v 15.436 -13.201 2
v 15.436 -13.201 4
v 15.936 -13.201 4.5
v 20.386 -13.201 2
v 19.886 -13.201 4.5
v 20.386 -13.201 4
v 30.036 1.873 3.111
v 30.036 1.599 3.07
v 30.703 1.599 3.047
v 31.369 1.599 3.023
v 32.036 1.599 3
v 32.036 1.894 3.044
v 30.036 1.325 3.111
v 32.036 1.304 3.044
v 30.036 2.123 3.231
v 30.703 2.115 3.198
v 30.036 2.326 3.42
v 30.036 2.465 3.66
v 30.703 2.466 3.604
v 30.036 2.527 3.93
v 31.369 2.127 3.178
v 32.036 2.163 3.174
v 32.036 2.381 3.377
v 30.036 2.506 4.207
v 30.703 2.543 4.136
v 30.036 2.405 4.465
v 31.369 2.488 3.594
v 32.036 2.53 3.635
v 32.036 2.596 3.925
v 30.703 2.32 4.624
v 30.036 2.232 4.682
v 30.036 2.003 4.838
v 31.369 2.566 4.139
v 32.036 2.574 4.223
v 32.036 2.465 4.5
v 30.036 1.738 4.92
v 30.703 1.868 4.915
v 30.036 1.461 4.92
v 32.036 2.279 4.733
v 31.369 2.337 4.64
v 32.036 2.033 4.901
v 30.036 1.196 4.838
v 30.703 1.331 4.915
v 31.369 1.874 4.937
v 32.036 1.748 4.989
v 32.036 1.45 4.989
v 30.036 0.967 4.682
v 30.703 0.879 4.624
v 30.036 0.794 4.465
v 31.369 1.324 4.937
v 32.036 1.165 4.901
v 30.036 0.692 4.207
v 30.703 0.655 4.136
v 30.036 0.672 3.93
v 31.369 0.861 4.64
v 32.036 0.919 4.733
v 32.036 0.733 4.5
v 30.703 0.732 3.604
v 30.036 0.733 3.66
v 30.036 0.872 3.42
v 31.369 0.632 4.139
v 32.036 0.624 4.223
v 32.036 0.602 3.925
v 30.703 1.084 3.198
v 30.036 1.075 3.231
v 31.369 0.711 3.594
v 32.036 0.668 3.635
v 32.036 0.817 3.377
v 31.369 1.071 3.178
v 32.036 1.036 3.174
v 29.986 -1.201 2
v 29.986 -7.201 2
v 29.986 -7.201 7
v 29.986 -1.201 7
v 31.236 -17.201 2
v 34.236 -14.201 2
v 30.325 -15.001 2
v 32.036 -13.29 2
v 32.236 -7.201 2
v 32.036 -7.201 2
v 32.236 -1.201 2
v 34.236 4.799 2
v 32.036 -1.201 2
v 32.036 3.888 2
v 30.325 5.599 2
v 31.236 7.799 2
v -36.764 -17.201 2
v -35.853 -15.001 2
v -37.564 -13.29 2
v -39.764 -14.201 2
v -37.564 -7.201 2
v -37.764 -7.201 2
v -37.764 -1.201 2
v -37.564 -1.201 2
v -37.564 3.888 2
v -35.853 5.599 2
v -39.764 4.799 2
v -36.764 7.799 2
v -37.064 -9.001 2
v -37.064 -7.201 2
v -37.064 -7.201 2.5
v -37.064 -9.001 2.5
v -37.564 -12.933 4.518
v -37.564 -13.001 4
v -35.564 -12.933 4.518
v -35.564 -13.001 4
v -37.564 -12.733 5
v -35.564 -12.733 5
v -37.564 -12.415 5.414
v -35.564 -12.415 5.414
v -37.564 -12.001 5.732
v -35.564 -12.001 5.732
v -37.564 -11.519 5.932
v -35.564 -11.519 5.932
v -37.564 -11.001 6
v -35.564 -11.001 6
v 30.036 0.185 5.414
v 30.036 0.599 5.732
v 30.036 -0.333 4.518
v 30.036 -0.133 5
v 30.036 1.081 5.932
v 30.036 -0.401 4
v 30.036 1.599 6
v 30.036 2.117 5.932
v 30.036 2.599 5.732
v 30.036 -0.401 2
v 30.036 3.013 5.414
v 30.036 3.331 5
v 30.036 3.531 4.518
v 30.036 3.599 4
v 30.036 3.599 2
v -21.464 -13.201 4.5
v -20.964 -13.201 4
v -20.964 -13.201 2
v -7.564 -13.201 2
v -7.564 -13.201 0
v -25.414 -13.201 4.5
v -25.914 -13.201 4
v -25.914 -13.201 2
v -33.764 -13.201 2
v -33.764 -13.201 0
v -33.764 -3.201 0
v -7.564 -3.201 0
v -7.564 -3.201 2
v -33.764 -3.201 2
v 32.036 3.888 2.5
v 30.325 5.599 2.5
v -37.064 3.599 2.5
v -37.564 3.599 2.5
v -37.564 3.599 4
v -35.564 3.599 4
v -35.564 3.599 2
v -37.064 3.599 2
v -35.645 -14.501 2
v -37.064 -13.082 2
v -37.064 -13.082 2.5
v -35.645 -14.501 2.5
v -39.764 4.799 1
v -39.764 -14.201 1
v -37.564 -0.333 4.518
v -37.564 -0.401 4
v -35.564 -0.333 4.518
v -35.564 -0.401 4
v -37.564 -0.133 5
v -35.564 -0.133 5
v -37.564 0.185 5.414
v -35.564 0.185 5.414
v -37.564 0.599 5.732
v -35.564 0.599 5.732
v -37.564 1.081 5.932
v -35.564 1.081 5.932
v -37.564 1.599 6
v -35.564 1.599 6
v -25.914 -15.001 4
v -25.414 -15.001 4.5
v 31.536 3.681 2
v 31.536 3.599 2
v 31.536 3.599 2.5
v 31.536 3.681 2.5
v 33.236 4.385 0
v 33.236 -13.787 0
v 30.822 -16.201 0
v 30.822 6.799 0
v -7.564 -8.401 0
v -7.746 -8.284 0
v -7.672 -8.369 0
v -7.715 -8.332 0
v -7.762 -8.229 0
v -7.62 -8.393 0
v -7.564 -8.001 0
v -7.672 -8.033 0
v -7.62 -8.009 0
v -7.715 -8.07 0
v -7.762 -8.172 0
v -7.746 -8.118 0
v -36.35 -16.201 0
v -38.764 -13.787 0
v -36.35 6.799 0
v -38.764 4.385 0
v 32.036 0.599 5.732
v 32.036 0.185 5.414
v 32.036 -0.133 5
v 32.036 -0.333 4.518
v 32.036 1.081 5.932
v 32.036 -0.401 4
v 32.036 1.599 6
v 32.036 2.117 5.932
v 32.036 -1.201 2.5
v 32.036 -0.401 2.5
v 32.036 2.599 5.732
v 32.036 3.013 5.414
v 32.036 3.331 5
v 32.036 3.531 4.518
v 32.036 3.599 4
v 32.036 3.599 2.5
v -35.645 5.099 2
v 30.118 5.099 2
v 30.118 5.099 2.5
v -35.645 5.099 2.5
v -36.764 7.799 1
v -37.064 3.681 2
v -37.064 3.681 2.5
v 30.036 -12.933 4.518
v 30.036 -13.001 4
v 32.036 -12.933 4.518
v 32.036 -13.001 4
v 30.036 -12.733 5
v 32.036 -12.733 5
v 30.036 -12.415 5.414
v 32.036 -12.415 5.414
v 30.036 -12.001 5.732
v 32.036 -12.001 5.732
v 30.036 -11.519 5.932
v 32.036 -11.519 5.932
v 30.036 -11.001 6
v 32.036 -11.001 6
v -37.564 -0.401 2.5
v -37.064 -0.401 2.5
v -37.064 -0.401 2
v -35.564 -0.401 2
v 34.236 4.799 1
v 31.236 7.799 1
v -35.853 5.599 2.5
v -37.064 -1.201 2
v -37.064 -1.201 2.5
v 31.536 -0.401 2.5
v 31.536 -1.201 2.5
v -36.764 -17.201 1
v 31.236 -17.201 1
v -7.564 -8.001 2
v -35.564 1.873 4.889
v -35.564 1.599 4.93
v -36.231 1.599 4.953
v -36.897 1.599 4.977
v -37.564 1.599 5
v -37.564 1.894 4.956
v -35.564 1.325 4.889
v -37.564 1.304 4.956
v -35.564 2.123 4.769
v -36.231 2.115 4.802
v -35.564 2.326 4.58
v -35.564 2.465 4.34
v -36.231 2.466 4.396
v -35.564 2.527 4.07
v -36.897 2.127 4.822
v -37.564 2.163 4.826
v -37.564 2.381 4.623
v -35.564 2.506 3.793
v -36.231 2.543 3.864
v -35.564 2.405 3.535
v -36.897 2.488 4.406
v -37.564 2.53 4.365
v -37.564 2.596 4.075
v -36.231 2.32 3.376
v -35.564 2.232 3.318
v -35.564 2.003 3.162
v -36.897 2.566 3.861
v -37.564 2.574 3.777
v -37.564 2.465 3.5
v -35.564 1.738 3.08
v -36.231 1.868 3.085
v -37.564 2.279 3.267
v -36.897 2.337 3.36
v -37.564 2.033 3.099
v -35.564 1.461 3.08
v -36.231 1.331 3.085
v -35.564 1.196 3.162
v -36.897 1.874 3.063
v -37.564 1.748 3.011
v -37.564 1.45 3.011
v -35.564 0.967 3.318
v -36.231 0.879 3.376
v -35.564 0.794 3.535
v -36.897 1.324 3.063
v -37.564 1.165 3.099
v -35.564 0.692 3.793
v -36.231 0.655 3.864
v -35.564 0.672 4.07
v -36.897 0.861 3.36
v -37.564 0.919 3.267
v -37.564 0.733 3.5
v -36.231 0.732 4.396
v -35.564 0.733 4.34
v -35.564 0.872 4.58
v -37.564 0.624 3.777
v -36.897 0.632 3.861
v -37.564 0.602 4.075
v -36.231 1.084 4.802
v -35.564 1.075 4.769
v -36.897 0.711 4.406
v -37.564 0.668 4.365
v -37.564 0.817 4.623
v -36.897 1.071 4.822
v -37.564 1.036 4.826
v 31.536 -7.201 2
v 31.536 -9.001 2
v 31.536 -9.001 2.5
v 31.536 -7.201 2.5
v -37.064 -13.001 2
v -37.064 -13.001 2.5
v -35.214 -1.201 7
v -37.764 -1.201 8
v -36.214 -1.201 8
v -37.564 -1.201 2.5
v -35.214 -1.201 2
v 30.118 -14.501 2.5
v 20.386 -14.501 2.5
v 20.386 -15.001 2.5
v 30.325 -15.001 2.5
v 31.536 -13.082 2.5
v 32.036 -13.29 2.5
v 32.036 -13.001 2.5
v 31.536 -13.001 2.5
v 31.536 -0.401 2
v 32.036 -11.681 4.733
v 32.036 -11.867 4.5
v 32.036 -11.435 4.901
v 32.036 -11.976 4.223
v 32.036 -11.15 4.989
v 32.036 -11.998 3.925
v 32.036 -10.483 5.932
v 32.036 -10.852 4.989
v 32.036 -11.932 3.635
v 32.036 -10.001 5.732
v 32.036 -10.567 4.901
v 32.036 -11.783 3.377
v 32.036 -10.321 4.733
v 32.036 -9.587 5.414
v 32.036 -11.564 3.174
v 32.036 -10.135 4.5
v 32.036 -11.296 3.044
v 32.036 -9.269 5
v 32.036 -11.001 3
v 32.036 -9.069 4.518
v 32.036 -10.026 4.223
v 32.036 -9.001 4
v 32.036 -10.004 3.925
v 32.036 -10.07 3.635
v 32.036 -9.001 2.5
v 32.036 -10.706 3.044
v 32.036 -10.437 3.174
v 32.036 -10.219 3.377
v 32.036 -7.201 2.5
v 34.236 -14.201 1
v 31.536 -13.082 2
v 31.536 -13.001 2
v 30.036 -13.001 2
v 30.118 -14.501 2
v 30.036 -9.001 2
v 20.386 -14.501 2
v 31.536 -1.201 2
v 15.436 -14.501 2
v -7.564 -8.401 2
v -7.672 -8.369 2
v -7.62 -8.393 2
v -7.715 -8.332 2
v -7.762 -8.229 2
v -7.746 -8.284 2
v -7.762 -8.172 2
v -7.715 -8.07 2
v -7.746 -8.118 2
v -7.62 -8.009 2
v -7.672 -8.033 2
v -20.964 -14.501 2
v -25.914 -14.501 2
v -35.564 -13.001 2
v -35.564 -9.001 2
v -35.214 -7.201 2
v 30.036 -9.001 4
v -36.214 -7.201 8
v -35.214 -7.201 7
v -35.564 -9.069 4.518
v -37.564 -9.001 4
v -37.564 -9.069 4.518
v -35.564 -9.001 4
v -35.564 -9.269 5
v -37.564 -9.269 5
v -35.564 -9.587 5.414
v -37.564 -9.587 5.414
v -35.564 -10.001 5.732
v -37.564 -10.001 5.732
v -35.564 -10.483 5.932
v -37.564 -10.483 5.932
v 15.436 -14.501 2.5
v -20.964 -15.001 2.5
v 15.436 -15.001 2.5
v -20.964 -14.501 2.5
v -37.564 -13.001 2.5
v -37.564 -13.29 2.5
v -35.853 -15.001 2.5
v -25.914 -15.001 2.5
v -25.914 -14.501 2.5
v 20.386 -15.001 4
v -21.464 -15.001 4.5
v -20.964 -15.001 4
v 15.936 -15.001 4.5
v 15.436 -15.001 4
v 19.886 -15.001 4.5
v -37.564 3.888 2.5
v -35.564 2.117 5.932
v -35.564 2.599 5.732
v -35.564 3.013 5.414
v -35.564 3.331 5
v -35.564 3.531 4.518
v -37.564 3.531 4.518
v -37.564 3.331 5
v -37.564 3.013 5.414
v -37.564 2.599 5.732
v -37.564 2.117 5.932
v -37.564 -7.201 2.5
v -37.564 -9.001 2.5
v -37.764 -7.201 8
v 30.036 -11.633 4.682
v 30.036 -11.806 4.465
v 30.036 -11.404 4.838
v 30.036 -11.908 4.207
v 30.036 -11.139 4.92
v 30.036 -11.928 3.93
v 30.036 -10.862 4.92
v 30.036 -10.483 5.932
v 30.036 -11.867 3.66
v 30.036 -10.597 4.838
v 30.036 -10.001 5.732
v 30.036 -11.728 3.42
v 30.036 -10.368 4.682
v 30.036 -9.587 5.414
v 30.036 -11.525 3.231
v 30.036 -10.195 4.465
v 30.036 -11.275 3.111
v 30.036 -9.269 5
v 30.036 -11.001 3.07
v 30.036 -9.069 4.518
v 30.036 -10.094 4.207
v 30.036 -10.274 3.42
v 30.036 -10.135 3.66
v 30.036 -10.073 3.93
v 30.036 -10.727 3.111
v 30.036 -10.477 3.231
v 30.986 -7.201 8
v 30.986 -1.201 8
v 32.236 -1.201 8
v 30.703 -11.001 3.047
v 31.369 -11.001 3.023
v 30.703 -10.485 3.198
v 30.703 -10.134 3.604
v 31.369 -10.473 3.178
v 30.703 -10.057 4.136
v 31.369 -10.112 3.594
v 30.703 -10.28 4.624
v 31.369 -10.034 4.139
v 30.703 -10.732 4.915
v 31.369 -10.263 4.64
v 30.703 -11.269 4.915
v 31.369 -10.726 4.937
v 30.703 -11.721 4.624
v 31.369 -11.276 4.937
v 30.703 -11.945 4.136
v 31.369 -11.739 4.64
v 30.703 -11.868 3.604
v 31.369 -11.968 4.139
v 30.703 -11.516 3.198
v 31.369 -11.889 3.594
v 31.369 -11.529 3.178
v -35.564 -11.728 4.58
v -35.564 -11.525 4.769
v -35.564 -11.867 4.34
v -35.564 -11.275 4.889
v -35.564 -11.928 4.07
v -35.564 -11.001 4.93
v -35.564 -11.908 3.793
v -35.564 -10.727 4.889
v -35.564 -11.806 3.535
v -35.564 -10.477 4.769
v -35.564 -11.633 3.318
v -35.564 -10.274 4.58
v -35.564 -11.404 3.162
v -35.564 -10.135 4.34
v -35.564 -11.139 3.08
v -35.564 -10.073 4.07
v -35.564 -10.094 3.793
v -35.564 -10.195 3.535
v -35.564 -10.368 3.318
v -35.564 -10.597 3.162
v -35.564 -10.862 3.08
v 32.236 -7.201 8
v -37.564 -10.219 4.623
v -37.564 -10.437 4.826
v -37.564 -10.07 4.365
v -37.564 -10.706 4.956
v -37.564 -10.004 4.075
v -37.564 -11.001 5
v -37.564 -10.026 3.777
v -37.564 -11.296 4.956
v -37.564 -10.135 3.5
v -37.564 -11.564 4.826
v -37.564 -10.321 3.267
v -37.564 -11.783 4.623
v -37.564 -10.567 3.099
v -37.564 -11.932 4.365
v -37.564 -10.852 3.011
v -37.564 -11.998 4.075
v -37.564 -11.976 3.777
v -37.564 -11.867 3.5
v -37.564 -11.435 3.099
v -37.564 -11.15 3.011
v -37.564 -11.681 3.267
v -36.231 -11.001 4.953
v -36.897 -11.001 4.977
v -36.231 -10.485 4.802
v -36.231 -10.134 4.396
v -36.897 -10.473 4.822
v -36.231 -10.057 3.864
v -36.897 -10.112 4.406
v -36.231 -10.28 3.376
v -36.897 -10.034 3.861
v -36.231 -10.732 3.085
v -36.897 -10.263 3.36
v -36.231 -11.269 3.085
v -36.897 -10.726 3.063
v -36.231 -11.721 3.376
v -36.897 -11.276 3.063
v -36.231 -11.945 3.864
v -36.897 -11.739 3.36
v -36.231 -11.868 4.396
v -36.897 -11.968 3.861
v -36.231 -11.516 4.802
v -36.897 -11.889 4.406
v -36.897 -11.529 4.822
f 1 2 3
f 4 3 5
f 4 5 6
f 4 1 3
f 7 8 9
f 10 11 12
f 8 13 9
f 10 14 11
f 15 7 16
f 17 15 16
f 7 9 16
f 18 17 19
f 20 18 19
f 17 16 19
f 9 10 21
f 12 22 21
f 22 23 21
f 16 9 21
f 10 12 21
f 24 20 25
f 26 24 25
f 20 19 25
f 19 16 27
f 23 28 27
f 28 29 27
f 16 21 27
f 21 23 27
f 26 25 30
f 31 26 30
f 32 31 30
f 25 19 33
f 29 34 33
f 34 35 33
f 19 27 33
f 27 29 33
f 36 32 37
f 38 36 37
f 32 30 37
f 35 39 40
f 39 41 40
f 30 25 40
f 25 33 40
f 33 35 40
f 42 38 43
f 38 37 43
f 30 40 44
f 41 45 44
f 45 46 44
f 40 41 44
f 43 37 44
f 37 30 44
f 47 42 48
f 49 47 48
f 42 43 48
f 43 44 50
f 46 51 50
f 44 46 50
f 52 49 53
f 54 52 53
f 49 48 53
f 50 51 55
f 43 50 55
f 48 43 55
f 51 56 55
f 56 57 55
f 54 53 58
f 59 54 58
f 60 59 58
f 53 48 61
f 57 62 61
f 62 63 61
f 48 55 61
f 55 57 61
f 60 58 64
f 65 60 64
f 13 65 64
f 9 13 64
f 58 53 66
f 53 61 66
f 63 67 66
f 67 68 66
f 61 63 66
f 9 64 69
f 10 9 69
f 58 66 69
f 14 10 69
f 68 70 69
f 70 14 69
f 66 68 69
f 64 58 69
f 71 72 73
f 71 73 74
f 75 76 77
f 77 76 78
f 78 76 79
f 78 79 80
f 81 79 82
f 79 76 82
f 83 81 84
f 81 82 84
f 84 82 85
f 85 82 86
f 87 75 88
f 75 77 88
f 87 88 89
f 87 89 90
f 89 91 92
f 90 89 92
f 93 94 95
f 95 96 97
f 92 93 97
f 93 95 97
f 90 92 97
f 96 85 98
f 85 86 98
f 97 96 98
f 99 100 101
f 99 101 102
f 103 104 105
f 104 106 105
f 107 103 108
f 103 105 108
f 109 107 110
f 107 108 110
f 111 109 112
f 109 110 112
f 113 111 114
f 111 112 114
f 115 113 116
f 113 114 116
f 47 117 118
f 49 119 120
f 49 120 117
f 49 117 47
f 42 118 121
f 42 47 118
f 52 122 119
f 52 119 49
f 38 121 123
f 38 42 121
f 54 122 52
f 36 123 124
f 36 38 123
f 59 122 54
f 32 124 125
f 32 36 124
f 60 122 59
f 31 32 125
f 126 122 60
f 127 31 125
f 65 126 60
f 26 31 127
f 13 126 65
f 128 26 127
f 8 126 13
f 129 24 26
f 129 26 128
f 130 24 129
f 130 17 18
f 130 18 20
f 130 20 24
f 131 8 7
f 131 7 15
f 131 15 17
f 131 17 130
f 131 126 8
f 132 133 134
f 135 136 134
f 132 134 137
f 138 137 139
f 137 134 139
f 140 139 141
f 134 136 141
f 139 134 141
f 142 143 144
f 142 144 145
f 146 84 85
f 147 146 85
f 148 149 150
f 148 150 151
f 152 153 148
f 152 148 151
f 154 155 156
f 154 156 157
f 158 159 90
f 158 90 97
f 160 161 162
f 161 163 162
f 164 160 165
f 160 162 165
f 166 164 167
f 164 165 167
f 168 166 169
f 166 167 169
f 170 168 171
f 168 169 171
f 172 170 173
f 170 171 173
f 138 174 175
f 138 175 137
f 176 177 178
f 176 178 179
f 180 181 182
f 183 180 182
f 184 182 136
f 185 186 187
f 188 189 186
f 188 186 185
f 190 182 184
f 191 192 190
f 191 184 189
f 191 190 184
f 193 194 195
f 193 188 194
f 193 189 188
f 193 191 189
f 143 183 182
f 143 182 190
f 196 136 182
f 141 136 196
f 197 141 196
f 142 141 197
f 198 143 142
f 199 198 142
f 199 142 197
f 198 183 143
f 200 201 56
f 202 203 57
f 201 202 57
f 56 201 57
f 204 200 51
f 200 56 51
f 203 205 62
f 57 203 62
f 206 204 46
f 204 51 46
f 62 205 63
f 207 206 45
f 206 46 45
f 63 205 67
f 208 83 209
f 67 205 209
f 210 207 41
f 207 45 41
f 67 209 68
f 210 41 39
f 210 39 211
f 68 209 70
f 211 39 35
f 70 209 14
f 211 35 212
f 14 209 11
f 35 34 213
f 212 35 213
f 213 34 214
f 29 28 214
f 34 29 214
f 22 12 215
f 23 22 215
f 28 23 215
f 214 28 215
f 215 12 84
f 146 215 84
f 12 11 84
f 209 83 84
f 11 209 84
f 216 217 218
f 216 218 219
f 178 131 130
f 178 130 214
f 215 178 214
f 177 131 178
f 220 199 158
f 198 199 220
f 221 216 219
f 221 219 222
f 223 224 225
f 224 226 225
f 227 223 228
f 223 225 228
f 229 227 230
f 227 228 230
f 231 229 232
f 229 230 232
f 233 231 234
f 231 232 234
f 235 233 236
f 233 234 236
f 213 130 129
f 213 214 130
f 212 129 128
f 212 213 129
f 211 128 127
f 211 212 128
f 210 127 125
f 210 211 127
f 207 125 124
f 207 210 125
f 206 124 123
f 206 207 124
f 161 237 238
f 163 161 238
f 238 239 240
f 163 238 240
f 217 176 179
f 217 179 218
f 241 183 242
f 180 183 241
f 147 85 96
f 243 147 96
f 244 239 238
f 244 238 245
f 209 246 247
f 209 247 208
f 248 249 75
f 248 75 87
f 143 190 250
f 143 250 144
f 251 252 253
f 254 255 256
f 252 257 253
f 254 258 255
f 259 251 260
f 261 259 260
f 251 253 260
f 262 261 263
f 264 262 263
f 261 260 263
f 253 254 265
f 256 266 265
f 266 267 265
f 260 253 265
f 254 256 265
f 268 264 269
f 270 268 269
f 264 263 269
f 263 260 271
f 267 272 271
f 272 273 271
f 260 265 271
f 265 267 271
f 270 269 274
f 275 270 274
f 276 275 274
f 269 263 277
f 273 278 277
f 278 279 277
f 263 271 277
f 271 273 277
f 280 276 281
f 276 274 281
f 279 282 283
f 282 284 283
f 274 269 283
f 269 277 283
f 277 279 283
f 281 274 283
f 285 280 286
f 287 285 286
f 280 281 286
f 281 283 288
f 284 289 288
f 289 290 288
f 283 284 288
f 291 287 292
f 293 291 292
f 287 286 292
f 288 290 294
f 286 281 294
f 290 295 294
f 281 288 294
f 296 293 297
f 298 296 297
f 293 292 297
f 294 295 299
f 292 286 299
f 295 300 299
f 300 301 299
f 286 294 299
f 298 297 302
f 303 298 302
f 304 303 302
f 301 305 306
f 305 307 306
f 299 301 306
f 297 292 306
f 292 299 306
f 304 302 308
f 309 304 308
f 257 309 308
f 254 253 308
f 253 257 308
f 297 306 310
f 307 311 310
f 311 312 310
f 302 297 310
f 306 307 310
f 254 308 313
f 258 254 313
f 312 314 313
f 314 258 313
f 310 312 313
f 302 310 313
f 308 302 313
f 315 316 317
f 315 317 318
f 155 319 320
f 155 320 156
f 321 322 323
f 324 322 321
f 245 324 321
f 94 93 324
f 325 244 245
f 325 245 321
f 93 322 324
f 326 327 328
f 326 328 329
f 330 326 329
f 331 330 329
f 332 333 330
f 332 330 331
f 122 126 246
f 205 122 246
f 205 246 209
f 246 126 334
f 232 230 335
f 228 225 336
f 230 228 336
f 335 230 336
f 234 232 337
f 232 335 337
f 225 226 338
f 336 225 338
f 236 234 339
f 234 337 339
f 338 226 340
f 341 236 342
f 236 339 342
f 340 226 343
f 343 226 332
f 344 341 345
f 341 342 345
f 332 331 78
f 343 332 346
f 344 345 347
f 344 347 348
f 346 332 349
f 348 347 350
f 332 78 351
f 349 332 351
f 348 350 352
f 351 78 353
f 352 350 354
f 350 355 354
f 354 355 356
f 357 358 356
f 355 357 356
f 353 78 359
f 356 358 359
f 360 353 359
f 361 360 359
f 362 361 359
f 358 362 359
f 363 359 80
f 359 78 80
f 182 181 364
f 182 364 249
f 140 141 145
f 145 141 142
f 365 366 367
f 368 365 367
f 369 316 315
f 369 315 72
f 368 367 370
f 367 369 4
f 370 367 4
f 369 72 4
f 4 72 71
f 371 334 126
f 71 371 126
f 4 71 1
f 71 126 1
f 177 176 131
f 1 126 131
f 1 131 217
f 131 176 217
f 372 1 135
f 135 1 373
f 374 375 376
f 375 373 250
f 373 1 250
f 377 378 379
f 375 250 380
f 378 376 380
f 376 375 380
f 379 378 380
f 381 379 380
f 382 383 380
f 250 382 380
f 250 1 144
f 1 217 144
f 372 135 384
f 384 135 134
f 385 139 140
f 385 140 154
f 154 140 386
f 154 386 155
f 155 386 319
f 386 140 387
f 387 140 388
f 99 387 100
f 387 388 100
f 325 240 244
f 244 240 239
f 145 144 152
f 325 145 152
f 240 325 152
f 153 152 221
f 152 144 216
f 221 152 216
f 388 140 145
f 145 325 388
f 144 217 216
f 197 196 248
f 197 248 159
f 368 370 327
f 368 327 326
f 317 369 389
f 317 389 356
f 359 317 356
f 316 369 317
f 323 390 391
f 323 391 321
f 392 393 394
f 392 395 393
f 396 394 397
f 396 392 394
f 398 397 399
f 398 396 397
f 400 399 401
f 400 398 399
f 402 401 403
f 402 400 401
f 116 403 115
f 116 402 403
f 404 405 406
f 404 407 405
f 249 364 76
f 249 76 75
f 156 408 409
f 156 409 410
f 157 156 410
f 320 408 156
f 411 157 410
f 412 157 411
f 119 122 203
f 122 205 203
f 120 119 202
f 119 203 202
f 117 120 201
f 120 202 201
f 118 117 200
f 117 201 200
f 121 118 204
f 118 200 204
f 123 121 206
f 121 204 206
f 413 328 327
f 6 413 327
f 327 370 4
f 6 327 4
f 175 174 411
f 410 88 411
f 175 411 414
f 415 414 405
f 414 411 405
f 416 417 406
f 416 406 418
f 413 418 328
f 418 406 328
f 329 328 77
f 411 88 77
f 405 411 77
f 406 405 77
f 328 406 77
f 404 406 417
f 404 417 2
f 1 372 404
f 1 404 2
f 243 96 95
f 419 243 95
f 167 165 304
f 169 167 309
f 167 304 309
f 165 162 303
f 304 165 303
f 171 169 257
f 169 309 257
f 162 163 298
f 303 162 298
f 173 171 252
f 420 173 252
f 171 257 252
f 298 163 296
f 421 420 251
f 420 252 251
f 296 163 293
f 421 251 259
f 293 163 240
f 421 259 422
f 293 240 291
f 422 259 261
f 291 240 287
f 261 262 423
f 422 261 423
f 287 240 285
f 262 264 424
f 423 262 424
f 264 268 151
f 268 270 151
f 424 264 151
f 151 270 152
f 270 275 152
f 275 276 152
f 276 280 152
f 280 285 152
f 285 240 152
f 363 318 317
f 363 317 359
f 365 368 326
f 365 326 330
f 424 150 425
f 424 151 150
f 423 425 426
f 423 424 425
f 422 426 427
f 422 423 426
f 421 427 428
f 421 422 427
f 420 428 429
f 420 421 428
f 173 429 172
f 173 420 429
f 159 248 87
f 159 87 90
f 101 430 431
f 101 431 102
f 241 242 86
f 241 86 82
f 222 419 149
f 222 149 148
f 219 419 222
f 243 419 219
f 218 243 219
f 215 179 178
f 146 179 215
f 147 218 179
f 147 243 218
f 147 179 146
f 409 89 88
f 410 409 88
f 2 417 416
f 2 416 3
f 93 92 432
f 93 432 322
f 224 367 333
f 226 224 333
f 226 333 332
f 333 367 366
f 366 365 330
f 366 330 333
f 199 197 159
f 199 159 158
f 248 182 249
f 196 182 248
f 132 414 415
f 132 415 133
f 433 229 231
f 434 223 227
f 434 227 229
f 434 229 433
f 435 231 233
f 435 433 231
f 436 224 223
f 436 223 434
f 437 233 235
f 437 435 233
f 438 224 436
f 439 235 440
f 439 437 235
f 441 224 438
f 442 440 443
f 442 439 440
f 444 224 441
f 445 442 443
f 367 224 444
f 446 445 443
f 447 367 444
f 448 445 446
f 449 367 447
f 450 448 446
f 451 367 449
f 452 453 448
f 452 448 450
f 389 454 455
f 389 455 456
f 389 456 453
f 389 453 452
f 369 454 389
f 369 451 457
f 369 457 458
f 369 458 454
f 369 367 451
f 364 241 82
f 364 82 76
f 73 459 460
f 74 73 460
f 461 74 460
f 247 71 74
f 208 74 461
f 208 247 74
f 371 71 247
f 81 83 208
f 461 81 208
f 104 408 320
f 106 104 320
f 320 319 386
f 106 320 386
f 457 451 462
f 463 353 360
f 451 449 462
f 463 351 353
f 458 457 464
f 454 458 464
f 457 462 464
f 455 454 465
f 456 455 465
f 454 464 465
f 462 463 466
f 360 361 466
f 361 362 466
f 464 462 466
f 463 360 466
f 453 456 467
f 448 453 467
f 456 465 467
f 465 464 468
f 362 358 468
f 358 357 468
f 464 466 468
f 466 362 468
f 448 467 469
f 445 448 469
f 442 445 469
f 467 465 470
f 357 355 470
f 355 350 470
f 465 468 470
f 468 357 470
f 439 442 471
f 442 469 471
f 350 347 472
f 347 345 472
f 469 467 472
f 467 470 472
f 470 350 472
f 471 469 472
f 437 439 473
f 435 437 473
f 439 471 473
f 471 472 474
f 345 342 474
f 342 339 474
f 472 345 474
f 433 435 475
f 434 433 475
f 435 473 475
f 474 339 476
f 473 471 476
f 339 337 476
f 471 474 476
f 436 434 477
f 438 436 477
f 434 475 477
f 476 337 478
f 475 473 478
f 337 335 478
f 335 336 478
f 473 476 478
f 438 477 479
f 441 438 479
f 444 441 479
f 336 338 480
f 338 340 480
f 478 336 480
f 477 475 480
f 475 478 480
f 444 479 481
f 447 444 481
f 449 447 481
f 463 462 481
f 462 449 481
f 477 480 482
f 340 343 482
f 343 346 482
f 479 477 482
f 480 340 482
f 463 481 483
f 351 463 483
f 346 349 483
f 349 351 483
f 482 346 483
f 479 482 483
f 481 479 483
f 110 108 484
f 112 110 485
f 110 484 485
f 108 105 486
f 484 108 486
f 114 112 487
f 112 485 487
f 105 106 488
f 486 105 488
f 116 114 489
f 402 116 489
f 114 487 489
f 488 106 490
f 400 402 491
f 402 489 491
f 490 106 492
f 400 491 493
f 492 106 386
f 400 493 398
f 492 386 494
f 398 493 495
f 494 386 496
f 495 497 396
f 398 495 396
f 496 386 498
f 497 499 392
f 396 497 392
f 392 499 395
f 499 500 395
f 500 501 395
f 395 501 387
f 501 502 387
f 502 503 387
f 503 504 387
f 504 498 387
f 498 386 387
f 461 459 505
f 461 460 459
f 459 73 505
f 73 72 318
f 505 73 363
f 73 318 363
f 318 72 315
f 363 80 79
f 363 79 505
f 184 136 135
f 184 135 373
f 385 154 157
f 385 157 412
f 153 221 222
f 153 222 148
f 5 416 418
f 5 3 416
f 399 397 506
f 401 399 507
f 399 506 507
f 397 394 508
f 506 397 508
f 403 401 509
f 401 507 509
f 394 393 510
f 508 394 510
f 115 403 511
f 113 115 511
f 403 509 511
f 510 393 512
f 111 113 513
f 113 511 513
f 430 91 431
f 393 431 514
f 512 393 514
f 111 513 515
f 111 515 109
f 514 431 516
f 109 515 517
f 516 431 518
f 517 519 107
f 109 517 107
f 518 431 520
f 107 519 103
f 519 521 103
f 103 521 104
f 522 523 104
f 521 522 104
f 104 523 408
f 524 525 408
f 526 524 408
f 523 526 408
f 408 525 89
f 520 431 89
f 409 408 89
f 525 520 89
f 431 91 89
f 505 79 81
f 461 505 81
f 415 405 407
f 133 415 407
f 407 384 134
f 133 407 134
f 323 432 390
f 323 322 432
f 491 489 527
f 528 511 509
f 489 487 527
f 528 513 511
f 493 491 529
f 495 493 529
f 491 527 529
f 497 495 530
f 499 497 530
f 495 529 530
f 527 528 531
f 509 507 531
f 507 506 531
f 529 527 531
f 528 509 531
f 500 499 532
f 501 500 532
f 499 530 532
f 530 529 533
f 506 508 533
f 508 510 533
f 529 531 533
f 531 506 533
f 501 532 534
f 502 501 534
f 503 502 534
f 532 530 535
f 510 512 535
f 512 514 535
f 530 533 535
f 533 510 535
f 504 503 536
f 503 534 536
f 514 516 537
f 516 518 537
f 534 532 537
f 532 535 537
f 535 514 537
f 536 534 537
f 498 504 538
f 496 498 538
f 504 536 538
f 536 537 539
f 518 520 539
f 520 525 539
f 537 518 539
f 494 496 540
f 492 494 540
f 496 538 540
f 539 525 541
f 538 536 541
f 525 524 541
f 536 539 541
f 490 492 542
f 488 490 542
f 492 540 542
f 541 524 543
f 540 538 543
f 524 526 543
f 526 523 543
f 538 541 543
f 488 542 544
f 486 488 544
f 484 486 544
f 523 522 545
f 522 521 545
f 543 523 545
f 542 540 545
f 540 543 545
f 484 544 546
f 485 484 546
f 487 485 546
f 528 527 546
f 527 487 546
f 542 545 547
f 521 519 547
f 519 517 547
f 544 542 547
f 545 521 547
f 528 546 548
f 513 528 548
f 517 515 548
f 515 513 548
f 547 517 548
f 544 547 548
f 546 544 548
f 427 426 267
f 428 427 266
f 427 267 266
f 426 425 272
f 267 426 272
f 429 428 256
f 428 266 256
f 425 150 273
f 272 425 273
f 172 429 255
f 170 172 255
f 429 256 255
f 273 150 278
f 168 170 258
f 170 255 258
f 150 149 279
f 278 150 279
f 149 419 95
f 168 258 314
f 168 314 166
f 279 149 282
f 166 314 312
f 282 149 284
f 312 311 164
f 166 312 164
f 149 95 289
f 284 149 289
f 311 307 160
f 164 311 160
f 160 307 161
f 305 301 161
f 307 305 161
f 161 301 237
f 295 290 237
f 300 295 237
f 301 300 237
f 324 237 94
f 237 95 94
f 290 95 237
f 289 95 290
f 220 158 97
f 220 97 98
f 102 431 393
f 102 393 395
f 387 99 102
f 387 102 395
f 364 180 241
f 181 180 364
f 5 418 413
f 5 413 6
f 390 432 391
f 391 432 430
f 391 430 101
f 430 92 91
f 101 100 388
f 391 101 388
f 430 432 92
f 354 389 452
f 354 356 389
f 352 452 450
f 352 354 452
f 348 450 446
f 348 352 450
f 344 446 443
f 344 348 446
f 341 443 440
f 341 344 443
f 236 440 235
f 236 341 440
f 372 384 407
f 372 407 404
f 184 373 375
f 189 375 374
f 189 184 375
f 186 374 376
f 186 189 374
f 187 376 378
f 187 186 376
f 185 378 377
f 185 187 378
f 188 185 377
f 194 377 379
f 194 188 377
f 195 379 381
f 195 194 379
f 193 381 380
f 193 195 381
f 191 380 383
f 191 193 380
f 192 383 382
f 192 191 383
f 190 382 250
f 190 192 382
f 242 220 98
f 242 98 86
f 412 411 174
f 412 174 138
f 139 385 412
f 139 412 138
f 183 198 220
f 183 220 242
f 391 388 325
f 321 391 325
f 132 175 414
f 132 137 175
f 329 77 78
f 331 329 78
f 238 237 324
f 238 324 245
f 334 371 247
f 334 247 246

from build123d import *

# Parameters (mm, degrees)
EXTRUDE_1_DEPTH               = 2
CHAMFER_1_SIZE                = 1
SKETCH_3_W                    = 2
SKETCH_3_H                    = 4
EXTRUDE_2_DEPTH               = 4
FILLET_1_R                    = 2
SKETCH_4_R                    = 1
CUT_EXTRUDE_1_DEPTH           = 2
CUT_EXTRUDE_1_DRAFT           = -2
CUT_EXTRUDE_1_PROFILE_2_DEPTH = 2
CUT_EXTRUDE_1_PROFILE_2_DRAFT = -2
SKETCH_5_R                    = 1
CUT_EXTRUDE_2_DEPTH           = 2
CUT_EXTRUDE_2_DRAFT           = -2
CUT_EXTRUDE_2_PROFILE_2_DEPTH = 2
CUT_EXTRUDE_2_PROFILE_2_DRAFT = -2
SKETCH_8_W                    = 2.55
SKETCH_8_H                    = 6
SKETCH_8_W_2                  = 2.25
EXTRUDE_5_DEPTH               = 6
CHAMFER_3_SIZE                = 1
CUT_EXTRUDE_3_REACH           = 46.057
SKETCH_10_W                   = 26.2
SKETCH_10_H                   = 10
EXTRUDE_7_DEPTH               = 0.5
SKETCH_12_W                   = 4.95
SKETCH_12_H                   = 1.8
EXTRUDE_8_DEPTH               = 2.5
CHAMFER_4_SIZE                = 0.5
SKETCH_13_R                   = 0.2
EXTRUDE_9_DEPTH               = 2


with BuildPart() as part:
    # 草图1 → 凸台-拉伸1 (new body)
    with BuildSketch(Plane.XY):
        Polygon((-39.76383505, 4.799206062), (-36.76383505, 7.799206062), (31.23616495, 7.799206062), (34.23616495, 4.799206062), (34.23616495, -14.200793938), (31.23616495, -17.200793938), (-36.76383505, -17.200793938), (-39.76383505, -14.200793938), align=None)
    extrude(amount=EXTRUDE_1_DEPTH)

    # 倒角1
    chamfer_1_edges = [part.edges().sort_by_distance(p)[0] for p in [
        (-38.26383505, -15.700793938, 0),
        (-39.76383505, -4.700793938, 0),
        (-38.26383505, 6.299206062, 0),
        (-2.76383505, 7.799206062, 0),
        (32.73616495, 6.299206062, 0),
        (34.23616495, -4.700793938, 0),
        (32.73616495, -15.700793938, 0),
        (-2.76383505, -17.200793938, 0),
    ]]
    chamfer(chamfer_1_edges, length=CHAMFER_1_SIZE)

    # 草图3 → 凸台-拉伸2 (add)
    with BuildSketch(Plane.XY.offset(2)):
        with Locations((-36.56383505, 1.599206062)):
            Rectangle(SKETCH_3_W, SKETCH_3_H)
        with Locations((-36.56383505, -11.000793938)):
            Rectangle(SKETCH_3_W, SKETCH_3_H)
        with Locations((31.03616495, 1.599206062)):
            Rectangle(SKETCH_3_W, SKETCH_3_H)
        with Locations((31.03616495, -11.000793938)):
            Rectangle(SKETCH_3_W, SKETCH_3_H)
    extrude(amount=EXTRUDE_2_DEPTH)

    # 圆角1
    fillet_1_edges = [part.edges().sort_by_distance(p)[0] for p in [
        (31.03616495, 3.599206062, 6),
        (31.03616495, -0.400793938, 6),
        (31.03616495, -9.000793938, 6),
        (31.03616495, -13.000793938, 6),
        (-36.56383505, -13.000793938, 6),
        (-36.56383505, -9.000793938, 6),
        (-36.56383505, 3.599206062, 6),
        (-36.56383505, -0.400793938, 6),
    ]]
    fillet(fillet_1_edges, radius=FILLET_1_R - 0.0001)  # a hair under: the kernel refuses the full size


with BuildPart() as cut_extrude_1_tool:
    # 草图4 → 切除-拉伸1 (with draft: the straight prism first)
    with BuildSketch(Plane(origin=(32.03616495, 0, 0), x_dir=(0, 0, -1), z_dir=(1, 0, 0))):
        with Locations((-4, 1.599206062)):
            Circle(SKETCH_4_R)
    extrude(amount=-CUT_EXTRUDE_1_DEPTH)
    # 切除-拉伸1: the draft: its side faces are tilted about the plane it starts from
    cut_extrude_1_sides = [cut_extrude_1_tool.faces().sort_by_distance(p)[0] for p in [
        (31.03616495, 1.599206062, 5),
    ]]
    draft(cut_extrude_1_sides, Plane(origin=(32.03616495, 0, 0), x_dir=(0, 0, -1), z_dir=(1, 0, 0)), CUT_EXTRUDE_1_DRAFT)


with BuildPart() as part_1:
    add(part.part)

    # 切除-拉伸1: cut by cut_extrude_1_tool
    add(cut_extrude_1_tool.part, mode=Mode.SUBTRACT)


with BuildPart() as cut_extrude_1_profile_2_tool:
    # 草图4 → 切除-拉伸1 profile 2 (with draft: the straight prism first)
    with BuildSketch(Plane(origin=(32.03616495, 0, 0), x_dir=(0, 0, -1), z_dir=(1, 0, 0))):
        with Locations((-4, -11.000793938)):
            Circle(SKETCH_4_R)
    extrude(amount=-CUT_EXTRUDE_1_PROFILE_2_DEPTH)
    # 切除-拉伸1 profile 2: the draft: its side faces are tilted about the plane it starts from
    cut_extrude_1_profile_2_sides = [cut_extrude_1_profile_2_tool.faces().sort_by_distance(p)[0] for p in [
        (31.03616495, -11.000793938, 5),
    ]]
    draft(cut_extrude_1_profile_2_sides, Plane(origin=(32.03616495, 0, 0), x_dir=(0, 0, -1), z_dir=(1, 0, 0)), CUT_EXTRUDE_1_PROFILE_2_DRAFT)


with BuildPart() as part_2:
    add(part_1.part)

    # 切除-拉伸1 profile 2: cut by cut_extrude_1_profile_2_tool
    add(cut_extrude_1_profile_2_tool.part, mode=Mode.SUBTRACT)


with BuildPart() as cut_extrude_2_tool:
    # 草图5 → 切除-拉伸2 (with draft: the straight prism first)
    with BuildSketch(Plane.ZY.offset(37.56383505)):
        with Locations((4, 1.599206062)):
            Circle(SKETCH_5_R)
    extrude(amount=-CUT_EXTRUDE_2_DEPTH)
    # 切除-拉伸2: the draft: its side faces are tilted about the plane it starts from
    cut_extrude_2_sides = [cut_extrude_2_tool.faces().sort_by_distance(p)[0] for p in [
        (-36.56383505, 1.599206062, 3),
    ]]
    draft(cut_extrude_2_sides, Plane.ZY.offset(37.56383505), CUT_EXTRUDE_2_DRAFT)


with BuildPart() as part_3:
    add(part_2.part)

    # 切除-拉伸2: cut by cut_extrude_2_tool
    add(cut_extrude_2_tool.part, mode=Mode.SUBTRACT)


with BuildPart() as cut_extrude_2_profile_2_tool:
    # 草图5 → 切除-拉伸2 profile 2 (with draft: the straight prism first)
    with BuildSketch(Plane.ZY.offset(37.56383505)):
        with Locations((4, -11.000793938)):
            Circle(SKETCH_5_R)
    extrude(amount=-CUT_EXTRUDE_2_PROFILE_2_DEPTH)
    # 切除-拉伸2 profile 2: the draft: its side faces are tilted about the plane it starts from
    cut_extrude_2_profile_2_sides = [cut_extrude_2_profile_2_tool.faces().sort_by_distance(p)[0] for p in [
        (-36.56383505, -11.000793938, 3),
    ]]
    draft(cut_extrude_2_profile_2_sides, Plane.ZY.offset(37.56383505), CUT_EXTRUDE_2_PROFILE_2_DRAFT)


with BuildPart() as part_4:
    add(part_3.part)

    # 切除-拉伸2 profile 2: cut by cut_extrude_2_profile_2_tool
    add(cut_extrude_2_profile_2_tool.part, mode=Mode.SUBTRACT)

    # 草图8 → 凸台-拉伸5 (add)
    with BuildSketch(Plane.XY.offset(2)):
        with Locations((-36.48883505, -4.200793938)):
            Rectangle(SKETCH_8_W, SKETCH_8_H)
        with Locations((31.11116495, -4.200793938)):
            Rectangle(SKETCH_8_W_2, SKETCH_8_H)
    extrude(amount=EXTRUDE_5_DEPTH)

    # 倒角3
    chamfer_3_edges = [part_4.edges().sort_by_distance(p)[0] for p in [
        (-35.21383505, -4.200793938, 8),
        (29.98616495, -4.200793938, 8),
    ]]
    chamfer(chamfer_3_edges, length=CHAMFER_3_SIZE)

    # 草图10 → 切除-拉伸3 (cut, up to next)
    with BuildSketch(Plane(origin=(0, 0, 0), x_dir=(-1, 0, 0), z_dir=(0, 0, -1)), mode=Mode.PRIVATE) as cut_extrude_3_sk1:
        with Locations((20.66383505, -8.200793938)):
            Rectangle(SKETCH_10_W, SKETCH_10_H)
    cut_extrude_3_tool1 = extrude(cut_extrude_3_sk1.sketch, amount=-CUT_EXTRUDE_3_REACH, mode=Mode.PRIVATE) & part_4.part
    add(cut_extrude_3_tool1.solids().sort_by_distance((-20.663835, -8.200794, 0))[0], mode=Mode.SUBTRACT)

    # 草图11 → 凸台-拉伸7 (add)
    with BuildSketch(Plane.XY.offset(2)):
        Polygon((30.324895113, 5.599206062), (-35.852565213, 5.599206062), (-37.56383505, 3.887936224), (-37.56383505, -13.289524101), (-35.852565213, -15.000793938), (30.324895113, -15.000793938), (32.03616495, -13.289524101), (32.03616495, 3.887936224), align=None)
        Polygon((30.117788331, 5.099206062), (-35.645458432, 5.099206062), (-37.06383505, 3.680829443), (-37.06383505, -13.08241732), (-35.645458432, -14.500793938), (30.117788331, -14.500793938), (31.53616495, -13.08241732), (31.53616495, 3.680829443), align=None, mode=Mode.SUBTRACT)
    extrude(amount=EXTRUDE_7_DEPTH)

    # 草图12 → 凸台-拉伸8 (add)
    with BuildSketch(Plane.XY.offset(2)):
        with Locations((17.91116495, -14.100793938)):
            Rectangle(SKETCH_12_W, SKETCH_12_H)
        with Locations((-23.43883505, -14.100793938)):
            Rectangle(SKETCH_12_W, SKETCH_12_H)
    extrude(amount=EXTRUDE_8_DEPTH)

    # 倒角4
    chamfer_4_edges = [part_4.edges().sort_by_distance(p)[0] for p in [
        (15.43616495, -14.100793938, 4.5),
        (20.38616495, -14.100793938, 4.5),
        (-25.91383505, -14.100793938, 4.5),
        (-20.96383505, -14.100793938, 4.5),
    ]]
    chamfer(chamfer_4_edges, length=CHAMFER_4_SIZE)

    # 草图13 → 凸台-拉伸9 (add)
    with BuildSketch(Plane(origin=(0, 0, 0), x_dir=(-1, 0, 0), z_dir=(0, 0, -1))):
        with Locations((7.56383505, -8.200793938)):
            Circle(SKETCH_13_R)
    extrude(amount=-EXTRUDE_9_DEPTH)


solid = part_4.part
